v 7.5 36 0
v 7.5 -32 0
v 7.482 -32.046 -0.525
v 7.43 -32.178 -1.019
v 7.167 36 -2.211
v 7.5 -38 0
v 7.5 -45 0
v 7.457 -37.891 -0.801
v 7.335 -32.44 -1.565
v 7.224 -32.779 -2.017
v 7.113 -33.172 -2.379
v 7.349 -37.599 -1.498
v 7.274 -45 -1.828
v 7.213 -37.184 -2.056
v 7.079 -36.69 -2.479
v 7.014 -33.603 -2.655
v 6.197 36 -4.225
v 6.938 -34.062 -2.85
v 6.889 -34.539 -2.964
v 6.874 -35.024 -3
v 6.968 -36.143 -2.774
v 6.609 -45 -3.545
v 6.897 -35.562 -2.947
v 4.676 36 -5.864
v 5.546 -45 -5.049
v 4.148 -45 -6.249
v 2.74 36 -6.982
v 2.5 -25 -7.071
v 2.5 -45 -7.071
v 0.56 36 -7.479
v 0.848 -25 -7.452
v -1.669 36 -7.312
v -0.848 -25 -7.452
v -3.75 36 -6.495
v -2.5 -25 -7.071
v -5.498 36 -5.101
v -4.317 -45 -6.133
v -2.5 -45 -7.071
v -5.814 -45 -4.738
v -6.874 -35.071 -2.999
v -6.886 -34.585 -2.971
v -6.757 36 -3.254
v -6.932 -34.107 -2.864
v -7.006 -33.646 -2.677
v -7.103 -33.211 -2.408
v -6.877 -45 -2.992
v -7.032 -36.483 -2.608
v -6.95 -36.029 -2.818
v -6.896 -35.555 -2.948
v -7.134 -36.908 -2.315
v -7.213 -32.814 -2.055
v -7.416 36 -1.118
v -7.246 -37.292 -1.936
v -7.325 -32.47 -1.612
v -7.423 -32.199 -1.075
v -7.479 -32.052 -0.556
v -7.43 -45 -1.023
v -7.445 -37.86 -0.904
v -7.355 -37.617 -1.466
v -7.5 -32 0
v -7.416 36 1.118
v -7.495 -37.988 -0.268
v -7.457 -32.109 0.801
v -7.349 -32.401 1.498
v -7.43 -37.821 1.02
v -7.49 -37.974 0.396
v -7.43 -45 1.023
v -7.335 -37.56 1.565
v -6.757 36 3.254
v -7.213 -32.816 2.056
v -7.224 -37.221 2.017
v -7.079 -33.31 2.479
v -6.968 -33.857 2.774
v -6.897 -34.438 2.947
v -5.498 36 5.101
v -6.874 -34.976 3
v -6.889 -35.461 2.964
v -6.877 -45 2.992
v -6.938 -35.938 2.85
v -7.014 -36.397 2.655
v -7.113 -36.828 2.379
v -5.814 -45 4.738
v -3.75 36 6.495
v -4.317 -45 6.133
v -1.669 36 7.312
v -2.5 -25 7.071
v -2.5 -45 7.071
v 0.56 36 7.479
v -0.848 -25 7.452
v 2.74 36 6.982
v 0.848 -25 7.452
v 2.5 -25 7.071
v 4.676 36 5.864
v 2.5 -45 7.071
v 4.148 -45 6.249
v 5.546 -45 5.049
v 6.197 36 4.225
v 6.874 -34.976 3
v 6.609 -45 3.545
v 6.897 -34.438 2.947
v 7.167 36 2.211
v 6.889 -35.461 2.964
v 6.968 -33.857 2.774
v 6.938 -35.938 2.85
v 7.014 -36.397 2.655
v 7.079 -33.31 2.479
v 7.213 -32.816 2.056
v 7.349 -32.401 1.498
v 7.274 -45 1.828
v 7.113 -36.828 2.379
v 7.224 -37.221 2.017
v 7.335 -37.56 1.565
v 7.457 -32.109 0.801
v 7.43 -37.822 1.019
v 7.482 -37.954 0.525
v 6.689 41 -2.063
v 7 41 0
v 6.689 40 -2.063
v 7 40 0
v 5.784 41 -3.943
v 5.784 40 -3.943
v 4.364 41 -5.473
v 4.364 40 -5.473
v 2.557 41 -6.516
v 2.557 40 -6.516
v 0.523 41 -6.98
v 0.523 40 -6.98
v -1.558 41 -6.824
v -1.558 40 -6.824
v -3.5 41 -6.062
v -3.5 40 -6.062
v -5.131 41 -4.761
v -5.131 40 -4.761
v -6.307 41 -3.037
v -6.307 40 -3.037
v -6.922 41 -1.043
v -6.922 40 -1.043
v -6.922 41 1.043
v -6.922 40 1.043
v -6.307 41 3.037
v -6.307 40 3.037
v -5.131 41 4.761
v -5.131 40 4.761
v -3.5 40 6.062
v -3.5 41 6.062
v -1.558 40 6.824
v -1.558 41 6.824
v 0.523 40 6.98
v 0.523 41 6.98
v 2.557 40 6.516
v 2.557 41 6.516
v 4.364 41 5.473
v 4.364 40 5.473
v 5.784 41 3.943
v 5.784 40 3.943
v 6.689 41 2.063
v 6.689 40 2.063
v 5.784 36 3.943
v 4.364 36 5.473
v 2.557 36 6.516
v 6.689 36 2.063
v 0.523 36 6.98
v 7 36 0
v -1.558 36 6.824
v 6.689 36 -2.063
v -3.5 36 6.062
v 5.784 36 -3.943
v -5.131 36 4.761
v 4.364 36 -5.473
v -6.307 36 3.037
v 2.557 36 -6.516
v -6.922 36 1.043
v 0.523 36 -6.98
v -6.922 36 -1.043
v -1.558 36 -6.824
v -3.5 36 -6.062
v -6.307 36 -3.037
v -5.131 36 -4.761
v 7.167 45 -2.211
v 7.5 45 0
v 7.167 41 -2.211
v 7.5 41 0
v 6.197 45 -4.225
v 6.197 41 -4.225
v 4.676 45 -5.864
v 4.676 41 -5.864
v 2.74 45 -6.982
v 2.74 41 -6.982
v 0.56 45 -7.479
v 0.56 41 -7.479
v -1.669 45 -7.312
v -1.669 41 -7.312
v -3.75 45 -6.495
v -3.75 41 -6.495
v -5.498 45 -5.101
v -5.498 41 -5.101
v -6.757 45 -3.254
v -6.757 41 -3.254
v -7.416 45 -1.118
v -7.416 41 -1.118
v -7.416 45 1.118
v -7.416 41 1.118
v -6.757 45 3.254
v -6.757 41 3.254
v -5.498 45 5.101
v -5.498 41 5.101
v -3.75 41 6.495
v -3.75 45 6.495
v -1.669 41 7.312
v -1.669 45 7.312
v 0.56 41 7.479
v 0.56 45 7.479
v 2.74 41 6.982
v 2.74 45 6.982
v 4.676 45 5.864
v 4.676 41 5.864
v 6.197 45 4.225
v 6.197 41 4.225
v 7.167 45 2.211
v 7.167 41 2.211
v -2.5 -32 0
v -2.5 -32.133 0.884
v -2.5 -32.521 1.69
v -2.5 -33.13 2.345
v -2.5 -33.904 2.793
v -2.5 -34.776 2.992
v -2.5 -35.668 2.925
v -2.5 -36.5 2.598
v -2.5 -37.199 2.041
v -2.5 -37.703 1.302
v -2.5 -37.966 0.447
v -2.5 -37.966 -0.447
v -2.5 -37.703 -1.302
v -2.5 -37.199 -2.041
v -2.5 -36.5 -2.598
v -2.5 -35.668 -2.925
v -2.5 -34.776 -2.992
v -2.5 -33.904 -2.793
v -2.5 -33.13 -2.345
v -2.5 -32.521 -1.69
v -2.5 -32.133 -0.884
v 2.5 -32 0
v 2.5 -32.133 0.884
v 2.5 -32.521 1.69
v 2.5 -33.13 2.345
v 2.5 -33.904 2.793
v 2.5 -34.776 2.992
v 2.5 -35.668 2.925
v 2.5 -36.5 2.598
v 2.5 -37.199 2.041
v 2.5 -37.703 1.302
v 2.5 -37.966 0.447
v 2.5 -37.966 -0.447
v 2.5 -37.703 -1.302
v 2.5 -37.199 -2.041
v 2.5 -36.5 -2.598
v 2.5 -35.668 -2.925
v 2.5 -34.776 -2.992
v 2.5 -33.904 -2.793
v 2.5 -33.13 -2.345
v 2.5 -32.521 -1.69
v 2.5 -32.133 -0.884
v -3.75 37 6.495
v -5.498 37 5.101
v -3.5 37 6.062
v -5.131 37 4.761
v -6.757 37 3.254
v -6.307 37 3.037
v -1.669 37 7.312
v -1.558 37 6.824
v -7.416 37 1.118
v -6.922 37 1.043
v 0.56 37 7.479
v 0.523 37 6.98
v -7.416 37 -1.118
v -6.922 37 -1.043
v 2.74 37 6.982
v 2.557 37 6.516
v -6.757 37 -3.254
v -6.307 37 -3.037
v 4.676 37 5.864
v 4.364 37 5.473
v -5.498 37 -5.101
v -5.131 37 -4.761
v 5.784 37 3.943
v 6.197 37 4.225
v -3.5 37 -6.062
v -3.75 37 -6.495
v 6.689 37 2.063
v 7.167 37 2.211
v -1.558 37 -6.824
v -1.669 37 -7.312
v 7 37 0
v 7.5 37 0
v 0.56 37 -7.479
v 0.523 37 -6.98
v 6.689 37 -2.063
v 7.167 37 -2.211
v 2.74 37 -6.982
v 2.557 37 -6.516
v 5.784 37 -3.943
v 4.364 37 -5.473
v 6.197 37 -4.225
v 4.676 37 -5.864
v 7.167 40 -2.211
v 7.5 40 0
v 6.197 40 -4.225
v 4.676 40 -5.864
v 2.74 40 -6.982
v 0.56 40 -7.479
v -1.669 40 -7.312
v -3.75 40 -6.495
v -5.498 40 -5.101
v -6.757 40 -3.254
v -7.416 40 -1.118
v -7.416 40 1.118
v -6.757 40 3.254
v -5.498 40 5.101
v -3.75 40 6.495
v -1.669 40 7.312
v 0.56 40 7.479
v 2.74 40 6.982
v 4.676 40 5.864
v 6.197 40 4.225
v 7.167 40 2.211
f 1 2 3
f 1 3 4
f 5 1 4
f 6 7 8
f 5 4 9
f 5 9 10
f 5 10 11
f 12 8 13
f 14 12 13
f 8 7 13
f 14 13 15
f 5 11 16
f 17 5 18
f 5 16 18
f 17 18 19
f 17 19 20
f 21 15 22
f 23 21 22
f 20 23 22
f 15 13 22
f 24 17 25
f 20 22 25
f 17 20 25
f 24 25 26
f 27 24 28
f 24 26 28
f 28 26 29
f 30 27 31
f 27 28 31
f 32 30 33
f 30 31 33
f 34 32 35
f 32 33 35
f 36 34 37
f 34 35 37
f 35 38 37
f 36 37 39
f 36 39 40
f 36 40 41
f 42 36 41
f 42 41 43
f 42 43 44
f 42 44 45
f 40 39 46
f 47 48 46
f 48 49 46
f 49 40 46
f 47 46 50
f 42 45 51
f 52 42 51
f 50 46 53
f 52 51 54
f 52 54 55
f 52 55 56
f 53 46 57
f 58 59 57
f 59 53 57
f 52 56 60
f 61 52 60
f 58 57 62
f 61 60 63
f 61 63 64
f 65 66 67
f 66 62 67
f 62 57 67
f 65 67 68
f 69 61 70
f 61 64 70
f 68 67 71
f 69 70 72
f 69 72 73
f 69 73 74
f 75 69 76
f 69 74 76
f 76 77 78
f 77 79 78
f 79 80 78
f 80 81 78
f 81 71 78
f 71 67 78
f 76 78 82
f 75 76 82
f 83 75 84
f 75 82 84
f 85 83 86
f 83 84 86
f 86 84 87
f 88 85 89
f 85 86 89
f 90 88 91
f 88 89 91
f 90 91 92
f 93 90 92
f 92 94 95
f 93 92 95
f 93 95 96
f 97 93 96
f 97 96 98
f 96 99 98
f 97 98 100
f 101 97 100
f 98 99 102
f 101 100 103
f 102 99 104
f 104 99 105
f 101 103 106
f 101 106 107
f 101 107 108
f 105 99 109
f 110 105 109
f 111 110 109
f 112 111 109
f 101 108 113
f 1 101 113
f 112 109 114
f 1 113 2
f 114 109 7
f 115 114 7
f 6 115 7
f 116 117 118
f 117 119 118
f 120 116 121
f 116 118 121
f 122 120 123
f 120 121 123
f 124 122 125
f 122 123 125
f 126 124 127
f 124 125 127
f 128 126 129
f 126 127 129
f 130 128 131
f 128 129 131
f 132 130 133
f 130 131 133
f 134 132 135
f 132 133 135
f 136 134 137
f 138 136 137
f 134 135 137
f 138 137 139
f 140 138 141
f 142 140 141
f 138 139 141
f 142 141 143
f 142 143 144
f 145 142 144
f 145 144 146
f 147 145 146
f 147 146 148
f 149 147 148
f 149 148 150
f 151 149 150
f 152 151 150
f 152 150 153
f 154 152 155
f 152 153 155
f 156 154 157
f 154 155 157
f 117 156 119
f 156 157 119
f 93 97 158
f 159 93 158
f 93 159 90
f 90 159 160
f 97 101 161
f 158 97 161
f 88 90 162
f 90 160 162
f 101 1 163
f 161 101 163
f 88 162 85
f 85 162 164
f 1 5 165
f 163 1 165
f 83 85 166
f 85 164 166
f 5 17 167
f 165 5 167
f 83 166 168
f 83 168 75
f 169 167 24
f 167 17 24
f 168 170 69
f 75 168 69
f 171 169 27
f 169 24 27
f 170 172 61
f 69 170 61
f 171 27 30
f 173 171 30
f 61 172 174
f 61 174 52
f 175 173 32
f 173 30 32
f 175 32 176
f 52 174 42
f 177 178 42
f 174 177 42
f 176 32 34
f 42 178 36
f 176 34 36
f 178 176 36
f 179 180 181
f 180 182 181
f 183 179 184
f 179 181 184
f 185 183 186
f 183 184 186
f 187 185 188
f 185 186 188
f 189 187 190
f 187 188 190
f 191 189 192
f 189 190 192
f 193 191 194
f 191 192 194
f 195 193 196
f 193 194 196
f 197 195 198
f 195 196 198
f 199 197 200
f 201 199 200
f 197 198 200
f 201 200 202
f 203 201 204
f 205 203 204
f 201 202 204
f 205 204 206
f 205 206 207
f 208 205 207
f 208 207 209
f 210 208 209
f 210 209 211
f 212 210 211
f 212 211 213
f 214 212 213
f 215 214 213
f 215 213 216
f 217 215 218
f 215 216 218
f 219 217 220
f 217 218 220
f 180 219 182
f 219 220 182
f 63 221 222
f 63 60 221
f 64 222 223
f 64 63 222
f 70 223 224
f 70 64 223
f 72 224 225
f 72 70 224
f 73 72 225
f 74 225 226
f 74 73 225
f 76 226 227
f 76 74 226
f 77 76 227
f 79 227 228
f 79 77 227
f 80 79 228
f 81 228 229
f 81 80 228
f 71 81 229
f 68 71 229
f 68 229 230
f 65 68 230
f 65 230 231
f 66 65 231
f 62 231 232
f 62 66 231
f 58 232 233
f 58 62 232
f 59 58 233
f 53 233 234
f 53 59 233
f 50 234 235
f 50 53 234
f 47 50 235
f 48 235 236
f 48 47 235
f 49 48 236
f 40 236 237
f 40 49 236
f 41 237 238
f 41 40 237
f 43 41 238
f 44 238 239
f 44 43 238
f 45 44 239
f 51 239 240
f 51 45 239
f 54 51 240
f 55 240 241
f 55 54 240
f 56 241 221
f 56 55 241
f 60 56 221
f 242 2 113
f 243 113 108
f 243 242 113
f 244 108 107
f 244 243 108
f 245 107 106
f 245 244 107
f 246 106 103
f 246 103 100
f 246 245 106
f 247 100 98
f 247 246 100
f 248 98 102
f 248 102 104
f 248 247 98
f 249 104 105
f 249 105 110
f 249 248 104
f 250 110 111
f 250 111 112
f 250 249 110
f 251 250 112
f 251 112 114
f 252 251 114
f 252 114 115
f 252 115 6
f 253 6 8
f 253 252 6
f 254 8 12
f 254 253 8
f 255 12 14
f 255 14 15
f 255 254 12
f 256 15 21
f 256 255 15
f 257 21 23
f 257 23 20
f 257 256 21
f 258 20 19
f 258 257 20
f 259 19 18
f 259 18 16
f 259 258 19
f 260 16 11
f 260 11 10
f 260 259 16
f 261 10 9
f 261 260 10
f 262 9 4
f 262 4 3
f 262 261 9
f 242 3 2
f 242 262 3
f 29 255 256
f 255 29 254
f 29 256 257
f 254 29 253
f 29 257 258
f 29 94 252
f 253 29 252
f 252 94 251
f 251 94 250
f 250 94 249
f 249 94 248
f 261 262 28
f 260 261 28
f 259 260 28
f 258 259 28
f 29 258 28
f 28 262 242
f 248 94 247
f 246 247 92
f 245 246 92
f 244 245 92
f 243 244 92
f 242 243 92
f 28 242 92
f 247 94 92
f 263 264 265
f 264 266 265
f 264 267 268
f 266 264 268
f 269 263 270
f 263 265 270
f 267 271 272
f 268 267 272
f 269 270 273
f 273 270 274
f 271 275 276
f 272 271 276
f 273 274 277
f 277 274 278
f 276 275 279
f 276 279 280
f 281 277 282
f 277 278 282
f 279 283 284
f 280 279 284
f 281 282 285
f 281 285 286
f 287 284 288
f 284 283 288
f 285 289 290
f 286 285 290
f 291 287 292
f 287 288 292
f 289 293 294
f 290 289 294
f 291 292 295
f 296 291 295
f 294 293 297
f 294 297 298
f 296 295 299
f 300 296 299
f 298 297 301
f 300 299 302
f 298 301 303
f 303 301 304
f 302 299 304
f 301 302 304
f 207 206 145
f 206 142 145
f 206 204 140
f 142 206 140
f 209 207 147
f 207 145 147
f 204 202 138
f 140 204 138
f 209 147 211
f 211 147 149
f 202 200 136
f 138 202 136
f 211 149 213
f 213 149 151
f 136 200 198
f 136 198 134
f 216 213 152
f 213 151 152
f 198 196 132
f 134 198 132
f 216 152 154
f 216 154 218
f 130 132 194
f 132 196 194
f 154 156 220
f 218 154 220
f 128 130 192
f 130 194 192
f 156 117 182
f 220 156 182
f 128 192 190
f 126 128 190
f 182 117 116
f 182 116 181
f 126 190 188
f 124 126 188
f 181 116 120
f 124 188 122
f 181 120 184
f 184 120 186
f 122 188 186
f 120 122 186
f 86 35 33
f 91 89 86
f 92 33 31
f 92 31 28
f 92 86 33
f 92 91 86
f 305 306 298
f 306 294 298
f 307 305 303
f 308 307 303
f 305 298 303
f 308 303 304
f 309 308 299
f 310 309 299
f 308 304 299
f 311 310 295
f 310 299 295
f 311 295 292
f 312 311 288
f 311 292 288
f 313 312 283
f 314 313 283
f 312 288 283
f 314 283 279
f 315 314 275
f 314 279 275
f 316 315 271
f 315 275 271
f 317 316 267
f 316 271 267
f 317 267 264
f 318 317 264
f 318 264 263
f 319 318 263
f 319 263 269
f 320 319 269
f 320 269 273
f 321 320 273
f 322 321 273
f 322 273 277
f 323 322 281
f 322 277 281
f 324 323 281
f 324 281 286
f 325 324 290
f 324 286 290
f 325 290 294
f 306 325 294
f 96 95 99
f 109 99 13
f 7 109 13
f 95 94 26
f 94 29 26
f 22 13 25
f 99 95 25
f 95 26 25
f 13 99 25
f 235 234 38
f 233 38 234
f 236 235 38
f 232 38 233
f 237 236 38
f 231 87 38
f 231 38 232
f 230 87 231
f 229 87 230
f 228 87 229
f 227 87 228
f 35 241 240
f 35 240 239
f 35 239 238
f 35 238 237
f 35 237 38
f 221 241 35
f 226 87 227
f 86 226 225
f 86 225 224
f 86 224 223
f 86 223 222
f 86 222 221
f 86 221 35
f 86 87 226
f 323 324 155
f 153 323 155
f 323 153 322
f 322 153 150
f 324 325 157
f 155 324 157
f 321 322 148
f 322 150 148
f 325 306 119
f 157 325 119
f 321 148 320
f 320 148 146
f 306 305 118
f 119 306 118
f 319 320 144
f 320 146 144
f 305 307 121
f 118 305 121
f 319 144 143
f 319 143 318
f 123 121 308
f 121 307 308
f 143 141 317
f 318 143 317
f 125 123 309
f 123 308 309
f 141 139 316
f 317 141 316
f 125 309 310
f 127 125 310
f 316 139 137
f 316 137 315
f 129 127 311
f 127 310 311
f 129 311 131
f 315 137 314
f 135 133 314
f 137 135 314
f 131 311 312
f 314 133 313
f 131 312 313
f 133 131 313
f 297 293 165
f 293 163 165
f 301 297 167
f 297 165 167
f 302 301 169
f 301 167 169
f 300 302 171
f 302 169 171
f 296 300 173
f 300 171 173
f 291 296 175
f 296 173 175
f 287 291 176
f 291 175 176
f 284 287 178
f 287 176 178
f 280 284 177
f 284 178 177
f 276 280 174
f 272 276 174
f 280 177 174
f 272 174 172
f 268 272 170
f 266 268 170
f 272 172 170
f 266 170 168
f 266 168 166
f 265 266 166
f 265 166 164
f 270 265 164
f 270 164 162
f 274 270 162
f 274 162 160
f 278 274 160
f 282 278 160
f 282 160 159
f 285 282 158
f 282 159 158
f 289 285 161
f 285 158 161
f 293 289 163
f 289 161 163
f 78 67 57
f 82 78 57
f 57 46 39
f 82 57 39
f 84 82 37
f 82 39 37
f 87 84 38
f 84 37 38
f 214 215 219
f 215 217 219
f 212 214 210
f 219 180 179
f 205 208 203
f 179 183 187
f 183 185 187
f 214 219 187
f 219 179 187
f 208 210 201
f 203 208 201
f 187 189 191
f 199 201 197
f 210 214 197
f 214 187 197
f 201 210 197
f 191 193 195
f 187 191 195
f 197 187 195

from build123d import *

# Parameters (mm, degrees)
SKIZZE2_W                            = 5
SKIZZE2_H                            = 20
SCHNITT_LINEAR_AUSTRAGEN1_DEPTH      = 49.023431781
SCHNITT_LINEAR_AUSTRAGEN2_DEPTH      = 47.233105022
SCHNITT_LINEAR_AUSTRAGEN2_DEPTH_BACK = 47.233105022
SKIZZE5_R                            = 3


with BuildPart() as part:
    # Skizze1 → Rotation2 (revolve)
    with BuildSketch(Plane.XY, mode=Mode.PRIVATE) as rotation2_sk:
        Polygon((0, -45), (0, 45), (-7.5, 45), (-7.5, 41), (-7, 41), (-7, 40), (-7.5, 40), (-7.5, 37), (-7, 37), (-7, 36), (-7.5, 36), (-7.5, -45), align=None)
    revolve(rotation2_sk.sketch.rotate(Axis((0, -45, 0), (0, 1, 0)), 180), axis=Axis((0, -45, 0), (0, 1, 0)))

    # Skizze2 → Schnitt-Linear austragen1 (cut, through all)
    with BuildSketch(Plane.XY.offset(7.5)):
        with Locations((0, -35)):
            Rectangle(SKIZZE2_W, SKIZZE2_H)
    extrude(amount=-SCHNITT_LINEAR_AUSTRAGEN1_DEPTH, mode=Mode.SUBTRACT)

    # Skizze5 → Schnitt-Linear austragen2 (cut, two sides: drawn at the far end of the back side and taken through both)
    with BuildSketch(Plane(origin=(0, 0, 0), x_dir=(0, 0, -1), z_dir=(1, 0, 0)).offset(-SCHNITT_LINEAR_AUSTRAGEN2_DEPTH_BACK)):
        with Locations(Location((0, -35, 0), (0, 0, 90))):
            Circle(SKIZZE5_R)
    extrude(amount=SCHNITT_LINEAR_AUSTRAGEN2_DEPTH + SCHNITT_LINEAR_AUSTRAGEN2_DEPTH_BACK, mode=Mode.SUBTRACT)


solid = part.part
